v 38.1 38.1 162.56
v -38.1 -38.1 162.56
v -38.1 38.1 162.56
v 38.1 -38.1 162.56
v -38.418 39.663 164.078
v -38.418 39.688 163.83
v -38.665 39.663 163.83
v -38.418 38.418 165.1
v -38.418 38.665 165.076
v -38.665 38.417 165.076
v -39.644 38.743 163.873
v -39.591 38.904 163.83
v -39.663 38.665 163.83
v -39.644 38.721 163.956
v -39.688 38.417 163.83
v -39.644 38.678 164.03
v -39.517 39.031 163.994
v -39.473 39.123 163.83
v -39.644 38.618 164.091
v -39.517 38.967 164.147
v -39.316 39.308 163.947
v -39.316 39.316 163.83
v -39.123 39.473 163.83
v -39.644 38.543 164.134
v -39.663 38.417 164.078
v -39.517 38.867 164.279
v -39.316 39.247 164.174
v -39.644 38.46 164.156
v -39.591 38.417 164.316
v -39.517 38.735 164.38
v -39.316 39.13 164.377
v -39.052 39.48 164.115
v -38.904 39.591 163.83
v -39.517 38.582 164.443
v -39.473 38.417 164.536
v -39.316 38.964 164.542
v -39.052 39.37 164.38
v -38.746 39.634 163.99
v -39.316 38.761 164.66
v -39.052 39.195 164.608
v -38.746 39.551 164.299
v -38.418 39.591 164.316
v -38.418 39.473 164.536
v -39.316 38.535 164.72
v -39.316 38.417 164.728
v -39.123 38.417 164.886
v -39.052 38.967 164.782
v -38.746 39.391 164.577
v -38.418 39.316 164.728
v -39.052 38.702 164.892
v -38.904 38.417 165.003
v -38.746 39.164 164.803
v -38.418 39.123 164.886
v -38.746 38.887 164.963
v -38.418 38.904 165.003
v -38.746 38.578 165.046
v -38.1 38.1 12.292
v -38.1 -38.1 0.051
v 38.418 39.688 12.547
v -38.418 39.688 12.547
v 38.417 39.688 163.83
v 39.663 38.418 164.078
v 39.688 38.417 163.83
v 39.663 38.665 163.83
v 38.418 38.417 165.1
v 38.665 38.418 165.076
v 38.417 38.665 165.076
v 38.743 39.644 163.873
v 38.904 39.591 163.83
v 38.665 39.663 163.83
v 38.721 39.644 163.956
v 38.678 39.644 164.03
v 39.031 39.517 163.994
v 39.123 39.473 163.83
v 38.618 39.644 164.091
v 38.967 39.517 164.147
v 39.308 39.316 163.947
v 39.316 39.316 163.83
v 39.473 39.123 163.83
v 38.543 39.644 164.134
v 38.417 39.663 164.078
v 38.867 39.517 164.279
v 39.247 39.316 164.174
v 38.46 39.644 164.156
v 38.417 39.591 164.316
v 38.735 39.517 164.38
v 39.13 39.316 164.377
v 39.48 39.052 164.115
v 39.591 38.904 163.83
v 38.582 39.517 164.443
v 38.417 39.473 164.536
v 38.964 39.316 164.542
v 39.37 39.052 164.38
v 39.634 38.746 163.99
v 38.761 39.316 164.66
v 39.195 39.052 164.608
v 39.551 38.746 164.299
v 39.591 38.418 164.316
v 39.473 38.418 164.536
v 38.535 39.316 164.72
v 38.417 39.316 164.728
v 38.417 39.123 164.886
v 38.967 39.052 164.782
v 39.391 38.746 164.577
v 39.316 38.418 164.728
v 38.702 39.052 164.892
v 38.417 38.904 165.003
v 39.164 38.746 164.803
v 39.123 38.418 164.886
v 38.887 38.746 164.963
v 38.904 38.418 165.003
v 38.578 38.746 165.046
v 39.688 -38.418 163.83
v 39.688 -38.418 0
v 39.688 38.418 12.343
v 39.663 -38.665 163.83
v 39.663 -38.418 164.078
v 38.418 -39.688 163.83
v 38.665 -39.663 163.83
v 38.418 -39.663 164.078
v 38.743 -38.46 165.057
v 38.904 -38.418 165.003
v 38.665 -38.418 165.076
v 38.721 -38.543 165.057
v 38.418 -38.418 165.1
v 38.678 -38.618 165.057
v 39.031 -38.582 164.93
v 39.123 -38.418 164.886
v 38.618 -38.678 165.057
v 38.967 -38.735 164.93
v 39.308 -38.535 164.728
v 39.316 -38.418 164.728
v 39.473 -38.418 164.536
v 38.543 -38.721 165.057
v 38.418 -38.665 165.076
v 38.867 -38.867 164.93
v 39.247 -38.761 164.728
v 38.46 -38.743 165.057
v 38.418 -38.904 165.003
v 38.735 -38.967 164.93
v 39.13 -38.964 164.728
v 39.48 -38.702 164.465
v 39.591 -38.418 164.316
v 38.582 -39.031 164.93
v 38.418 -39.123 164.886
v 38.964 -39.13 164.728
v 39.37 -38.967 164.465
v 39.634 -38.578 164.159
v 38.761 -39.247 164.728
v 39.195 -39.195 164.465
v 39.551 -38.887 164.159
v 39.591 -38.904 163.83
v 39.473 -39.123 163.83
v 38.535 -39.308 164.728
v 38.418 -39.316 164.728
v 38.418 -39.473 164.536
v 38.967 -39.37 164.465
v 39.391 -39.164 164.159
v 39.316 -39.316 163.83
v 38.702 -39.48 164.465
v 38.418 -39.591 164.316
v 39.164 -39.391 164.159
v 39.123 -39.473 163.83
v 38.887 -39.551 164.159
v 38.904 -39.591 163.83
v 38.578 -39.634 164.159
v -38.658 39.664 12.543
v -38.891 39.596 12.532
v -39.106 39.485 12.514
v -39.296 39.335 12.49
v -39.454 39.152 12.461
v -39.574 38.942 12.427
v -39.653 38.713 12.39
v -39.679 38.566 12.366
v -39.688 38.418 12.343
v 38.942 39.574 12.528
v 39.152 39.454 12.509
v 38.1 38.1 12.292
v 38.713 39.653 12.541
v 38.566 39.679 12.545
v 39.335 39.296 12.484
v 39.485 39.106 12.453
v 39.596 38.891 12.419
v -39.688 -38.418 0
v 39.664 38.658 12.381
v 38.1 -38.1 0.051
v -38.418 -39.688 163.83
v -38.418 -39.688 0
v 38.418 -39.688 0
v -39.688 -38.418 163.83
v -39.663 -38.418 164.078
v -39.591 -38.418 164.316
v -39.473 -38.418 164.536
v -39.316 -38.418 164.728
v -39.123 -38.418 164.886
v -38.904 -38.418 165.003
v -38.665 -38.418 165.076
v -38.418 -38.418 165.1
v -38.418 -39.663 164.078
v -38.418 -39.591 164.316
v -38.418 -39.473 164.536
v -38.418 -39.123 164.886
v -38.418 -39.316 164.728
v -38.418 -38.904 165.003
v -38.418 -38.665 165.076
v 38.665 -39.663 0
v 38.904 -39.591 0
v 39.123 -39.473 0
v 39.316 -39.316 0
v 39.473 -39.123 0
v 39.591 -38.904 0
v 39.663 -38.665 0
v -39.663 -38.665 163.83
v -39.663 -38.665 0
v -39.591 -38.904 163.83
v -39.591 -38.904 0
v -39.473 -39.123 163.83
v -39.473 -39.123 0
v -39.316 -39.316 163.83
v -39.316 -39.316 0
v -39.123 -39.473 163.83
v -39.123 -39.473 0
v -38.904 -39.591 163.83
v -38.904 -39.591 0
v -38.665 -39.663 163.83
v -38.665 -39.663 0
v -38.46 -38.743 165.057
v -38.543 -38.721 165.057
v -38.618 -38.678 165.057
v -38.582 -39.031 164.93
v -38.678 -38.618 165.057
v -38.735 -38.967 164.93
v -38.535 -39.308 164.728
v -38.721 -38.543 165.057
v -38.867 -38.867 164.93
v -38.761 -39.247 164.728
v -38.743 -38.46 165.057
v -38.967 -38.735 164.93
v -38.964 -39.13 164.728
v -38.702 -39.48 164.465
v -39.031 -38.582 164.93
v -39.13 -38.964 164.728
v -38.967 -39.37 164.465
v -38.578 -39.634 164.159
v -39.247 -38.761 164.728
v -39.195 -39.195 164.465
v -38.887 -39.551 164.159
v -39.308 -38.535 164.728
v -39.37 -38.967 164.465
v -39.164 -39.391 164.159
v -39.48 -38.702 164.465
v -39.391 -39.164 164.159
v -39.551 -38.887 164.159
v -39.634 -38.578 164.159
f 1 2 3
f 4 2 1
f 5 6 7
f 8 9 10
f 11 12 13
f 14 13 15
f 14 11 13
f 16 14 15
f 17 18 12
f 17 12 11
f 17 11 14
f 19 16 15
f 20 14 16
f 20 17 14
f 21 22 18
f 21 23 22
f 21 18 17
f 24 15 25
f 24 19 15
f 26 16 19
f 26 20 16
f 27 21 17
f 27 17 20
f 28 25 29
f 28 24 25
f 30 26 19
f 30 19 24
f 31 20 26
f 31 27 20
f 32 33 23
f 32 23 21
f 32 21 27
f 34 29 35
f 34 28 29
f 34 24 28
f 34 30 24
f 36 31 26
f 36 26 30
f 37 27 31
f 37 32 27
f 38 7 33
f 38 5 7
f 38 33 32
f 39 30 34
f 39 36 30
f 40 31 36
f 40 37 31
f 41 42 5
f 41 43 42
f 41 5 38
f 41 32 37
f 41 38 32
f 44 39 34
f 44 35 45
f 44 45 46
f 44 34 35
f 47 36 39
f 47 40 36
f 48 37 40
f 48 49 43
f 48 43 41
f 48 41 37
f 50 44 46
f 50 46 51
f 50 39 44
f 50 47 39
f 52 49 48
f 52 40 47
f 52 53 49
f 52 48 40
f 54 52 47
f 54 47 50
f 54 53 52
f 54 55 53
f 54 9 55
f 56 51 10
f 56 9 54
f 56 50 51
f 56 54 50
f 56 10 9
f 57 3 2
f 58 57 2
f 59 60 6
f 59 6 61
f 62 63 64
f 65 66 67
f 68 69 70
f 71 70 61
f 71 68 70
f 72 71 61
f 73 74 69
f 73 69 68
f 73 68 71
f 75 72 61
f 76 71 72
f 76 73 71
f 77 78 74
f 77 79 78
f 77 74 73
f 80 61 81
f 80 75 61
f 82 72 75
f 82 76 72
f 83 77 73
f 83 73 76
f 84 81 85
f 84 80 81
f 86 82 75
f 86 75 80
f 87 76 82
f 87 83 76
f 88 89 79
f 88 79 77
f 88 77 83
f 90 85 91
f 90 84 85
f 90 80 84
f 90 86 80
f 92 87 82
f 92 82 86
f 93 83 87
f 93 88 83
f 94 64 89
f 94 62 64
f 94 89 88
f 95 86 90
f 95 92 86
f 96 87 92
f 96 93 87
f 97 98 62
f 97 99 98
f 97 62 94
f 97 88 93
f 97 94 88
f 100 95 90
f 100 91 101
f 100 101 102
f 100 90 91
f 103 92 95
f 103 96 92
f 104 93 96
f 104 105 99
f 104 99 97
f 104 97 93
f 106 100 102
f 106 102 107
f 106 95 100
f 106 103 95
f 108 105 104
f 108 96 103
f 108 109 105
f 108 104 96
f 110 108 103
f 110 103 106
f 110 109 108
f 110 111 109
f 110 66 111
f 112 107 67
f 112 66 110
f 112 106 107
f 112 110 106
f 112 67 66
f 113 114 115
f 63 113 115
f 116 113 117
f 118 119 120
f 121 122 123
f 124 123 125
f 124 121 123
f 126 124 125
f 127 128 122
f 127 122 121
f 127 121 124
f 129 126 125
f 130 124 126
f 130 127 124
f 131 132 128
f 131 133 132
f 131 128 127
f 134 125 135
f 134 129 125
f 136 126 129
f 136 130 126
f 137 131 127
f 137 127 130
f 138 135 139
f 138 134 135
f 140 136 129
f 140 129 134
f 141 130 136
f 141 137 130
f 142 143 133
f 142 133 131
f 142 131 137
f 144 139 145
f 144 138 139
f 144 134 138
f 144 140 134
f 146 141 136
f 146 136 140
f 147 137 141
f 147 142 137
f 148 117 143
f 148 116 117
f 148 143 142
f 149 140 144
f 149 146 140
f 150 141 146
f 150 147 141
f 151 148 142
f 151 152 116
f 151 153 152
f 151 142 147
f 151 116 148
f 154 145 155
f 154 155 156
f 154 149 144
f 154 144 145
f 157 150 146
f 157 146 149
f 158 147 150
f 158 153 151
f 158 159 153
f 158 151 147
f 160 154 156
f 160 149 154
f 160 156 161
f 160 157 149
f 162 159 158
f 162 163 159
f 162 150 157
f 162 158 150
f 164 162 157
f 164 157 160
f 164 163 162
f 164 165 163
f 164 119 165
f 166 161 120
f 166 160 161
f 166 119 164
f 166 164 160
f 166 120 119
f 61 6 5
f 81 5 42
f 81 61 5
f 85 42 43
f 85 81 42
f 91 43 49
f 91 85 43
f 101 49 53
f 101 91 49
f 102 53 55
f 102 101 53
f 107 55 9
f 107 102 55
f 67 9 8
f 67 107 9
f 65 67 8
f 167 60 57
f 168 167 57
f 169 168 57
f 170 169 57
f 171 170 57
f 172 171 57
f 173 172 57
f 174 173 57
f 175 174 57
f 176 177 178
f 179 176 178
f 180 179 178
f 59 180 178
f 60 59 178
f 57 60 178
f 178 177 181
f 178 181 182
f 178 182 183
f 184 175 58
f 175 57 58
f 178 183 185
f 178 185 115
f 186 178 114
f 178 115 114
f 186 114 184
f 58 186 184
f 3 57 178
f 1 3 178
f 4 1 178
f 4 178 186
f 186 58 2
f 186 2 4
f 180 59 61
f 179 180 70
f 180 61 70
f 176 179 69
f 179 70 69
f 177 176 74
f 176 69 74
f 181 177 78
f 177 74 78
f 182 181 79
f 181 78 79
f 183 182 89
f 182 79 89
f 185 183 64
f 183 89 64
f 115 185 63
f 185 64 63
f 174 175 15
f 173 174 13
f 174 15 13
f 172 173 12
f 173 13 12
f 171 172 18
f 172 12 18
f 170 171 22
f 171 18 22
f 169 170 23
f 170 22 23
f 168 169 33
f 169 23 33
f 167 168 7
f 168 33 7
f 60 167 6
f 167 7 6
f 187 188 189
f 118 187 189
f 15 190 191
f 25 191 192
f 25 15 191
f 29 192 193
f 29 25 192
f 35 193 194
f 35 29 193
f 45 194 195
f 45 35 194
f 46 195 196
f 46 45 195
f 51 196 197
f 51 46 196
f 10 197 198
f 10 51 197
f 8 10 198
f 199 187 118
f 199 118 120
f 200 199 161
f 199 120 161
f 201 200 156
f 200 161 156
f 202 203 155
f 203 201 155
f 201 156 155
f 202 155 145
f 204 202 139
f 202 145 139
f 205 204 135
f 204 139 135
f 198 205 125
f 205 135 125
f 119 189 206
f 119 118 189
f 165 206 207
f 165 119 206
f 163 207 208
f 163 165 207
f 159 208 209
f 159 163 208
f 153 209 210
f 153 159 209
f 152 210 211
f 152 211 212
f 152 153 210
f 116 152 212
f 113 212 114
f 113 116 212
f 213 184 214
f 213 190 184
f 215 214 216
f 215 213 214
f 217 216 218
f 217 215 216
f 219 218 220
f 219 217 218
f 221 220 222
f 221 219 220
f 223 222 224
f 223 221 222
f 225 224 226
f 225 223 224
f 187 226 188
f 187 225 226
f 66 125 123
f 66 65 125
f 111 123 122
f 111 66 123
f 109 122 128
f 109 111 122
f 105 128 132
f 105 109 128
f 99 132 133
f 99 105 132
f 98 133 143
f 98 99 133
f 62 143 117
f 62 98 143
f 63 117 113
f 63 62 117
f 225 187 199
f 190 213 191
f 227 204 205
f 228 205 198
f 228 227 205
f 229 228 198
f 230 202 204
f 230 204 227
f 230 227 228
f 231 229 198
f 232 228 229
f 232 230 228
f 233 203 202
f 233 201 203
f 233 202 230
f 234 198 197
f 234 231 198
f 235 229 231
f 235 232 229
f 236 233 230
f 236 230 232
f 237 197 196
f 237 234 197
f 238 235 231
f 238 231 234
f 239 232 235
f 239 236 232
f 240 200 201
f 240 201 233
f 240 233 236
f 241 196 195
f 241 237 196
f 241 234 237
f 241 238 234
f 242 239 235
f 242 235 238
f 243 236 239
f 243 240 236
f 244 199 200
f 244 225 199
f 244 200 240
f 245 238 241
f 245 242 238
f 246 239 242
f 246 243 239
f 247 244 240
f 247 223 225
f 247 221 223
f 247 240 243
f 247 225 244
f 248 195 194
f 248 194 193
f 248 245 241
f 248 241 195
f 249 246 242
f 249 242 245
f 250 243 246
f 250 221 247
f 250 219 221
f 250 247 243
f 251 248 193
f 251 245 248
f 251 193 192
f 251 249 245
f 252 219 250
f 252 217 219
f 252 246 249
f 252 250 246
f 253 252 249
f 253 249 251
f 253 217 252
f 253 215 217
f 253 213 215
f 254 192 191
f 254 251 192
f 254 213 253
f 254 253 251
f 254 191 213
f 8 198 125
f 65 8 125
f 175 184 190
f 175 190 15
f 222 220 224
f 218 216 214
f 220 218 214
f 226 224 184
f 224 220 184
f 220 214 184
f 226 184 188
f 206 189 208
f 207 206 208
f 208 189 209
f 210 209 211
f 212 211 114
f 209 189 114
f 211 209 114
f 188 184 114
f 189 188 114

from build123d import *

# Parameters (mm, degrees)
F0_W     = 79.375
F0_H     = 79.375
F1_DEPTH = 165.1
F2_W     = 76.2
F2_H     = 76.2
F3_DEPTH = 162.56
F4_R     = 1.27
F6_DEPTH = 79.376


with BuildPart() as f1:
    # F0 (on Top) → F1 (new body)
    with BuildSketch(Plane.XY):
        Rectangle(F0_W, F0_H)
    extrude(amount=F1_DEPTH)

    # F2 (on face) → F3 (cut)
    with BuildSketch(Plane(origin=(0, 0, 0), x_dir=(1, 0, 0), z_dir=(0, 0, -1))):
        Rectangle(F2_W, F2_H)
    extrude(amount=-F3_DEPTH, mode=Mode.SUBTRACT)

    # F4
    f4_edges = [f1.edges().sort_by_distance(p)[0] for p in [
        (39.6875, -39.6875, 82.55),
        (39.6875, 0, 165.1),
        (39.6875, 39.6875, 82.55),
        (-39.6875, -39.6875, 82.55),
        (0, -39.6875, 165.1),
        (0, 39.6875, 165.1),
        (-39.6875, 39.6875, 82.55),
        (-39.6875, 0, 165.1),
    ]]
    fillet(f4_edges, radius=F4_R)

    # F5 (on face) → F6 (cut, through all)
    with BuildSketch(Plane.YZ.offset(39.6875)):
        Polygon((46.8884, 13.7033), (-38.4175, 0), (46.8884, -9.378617), align=None)
    extrude(amount=-F6_DEPTH, mode=Mode.SUBTRACT)


solid = f1.part
